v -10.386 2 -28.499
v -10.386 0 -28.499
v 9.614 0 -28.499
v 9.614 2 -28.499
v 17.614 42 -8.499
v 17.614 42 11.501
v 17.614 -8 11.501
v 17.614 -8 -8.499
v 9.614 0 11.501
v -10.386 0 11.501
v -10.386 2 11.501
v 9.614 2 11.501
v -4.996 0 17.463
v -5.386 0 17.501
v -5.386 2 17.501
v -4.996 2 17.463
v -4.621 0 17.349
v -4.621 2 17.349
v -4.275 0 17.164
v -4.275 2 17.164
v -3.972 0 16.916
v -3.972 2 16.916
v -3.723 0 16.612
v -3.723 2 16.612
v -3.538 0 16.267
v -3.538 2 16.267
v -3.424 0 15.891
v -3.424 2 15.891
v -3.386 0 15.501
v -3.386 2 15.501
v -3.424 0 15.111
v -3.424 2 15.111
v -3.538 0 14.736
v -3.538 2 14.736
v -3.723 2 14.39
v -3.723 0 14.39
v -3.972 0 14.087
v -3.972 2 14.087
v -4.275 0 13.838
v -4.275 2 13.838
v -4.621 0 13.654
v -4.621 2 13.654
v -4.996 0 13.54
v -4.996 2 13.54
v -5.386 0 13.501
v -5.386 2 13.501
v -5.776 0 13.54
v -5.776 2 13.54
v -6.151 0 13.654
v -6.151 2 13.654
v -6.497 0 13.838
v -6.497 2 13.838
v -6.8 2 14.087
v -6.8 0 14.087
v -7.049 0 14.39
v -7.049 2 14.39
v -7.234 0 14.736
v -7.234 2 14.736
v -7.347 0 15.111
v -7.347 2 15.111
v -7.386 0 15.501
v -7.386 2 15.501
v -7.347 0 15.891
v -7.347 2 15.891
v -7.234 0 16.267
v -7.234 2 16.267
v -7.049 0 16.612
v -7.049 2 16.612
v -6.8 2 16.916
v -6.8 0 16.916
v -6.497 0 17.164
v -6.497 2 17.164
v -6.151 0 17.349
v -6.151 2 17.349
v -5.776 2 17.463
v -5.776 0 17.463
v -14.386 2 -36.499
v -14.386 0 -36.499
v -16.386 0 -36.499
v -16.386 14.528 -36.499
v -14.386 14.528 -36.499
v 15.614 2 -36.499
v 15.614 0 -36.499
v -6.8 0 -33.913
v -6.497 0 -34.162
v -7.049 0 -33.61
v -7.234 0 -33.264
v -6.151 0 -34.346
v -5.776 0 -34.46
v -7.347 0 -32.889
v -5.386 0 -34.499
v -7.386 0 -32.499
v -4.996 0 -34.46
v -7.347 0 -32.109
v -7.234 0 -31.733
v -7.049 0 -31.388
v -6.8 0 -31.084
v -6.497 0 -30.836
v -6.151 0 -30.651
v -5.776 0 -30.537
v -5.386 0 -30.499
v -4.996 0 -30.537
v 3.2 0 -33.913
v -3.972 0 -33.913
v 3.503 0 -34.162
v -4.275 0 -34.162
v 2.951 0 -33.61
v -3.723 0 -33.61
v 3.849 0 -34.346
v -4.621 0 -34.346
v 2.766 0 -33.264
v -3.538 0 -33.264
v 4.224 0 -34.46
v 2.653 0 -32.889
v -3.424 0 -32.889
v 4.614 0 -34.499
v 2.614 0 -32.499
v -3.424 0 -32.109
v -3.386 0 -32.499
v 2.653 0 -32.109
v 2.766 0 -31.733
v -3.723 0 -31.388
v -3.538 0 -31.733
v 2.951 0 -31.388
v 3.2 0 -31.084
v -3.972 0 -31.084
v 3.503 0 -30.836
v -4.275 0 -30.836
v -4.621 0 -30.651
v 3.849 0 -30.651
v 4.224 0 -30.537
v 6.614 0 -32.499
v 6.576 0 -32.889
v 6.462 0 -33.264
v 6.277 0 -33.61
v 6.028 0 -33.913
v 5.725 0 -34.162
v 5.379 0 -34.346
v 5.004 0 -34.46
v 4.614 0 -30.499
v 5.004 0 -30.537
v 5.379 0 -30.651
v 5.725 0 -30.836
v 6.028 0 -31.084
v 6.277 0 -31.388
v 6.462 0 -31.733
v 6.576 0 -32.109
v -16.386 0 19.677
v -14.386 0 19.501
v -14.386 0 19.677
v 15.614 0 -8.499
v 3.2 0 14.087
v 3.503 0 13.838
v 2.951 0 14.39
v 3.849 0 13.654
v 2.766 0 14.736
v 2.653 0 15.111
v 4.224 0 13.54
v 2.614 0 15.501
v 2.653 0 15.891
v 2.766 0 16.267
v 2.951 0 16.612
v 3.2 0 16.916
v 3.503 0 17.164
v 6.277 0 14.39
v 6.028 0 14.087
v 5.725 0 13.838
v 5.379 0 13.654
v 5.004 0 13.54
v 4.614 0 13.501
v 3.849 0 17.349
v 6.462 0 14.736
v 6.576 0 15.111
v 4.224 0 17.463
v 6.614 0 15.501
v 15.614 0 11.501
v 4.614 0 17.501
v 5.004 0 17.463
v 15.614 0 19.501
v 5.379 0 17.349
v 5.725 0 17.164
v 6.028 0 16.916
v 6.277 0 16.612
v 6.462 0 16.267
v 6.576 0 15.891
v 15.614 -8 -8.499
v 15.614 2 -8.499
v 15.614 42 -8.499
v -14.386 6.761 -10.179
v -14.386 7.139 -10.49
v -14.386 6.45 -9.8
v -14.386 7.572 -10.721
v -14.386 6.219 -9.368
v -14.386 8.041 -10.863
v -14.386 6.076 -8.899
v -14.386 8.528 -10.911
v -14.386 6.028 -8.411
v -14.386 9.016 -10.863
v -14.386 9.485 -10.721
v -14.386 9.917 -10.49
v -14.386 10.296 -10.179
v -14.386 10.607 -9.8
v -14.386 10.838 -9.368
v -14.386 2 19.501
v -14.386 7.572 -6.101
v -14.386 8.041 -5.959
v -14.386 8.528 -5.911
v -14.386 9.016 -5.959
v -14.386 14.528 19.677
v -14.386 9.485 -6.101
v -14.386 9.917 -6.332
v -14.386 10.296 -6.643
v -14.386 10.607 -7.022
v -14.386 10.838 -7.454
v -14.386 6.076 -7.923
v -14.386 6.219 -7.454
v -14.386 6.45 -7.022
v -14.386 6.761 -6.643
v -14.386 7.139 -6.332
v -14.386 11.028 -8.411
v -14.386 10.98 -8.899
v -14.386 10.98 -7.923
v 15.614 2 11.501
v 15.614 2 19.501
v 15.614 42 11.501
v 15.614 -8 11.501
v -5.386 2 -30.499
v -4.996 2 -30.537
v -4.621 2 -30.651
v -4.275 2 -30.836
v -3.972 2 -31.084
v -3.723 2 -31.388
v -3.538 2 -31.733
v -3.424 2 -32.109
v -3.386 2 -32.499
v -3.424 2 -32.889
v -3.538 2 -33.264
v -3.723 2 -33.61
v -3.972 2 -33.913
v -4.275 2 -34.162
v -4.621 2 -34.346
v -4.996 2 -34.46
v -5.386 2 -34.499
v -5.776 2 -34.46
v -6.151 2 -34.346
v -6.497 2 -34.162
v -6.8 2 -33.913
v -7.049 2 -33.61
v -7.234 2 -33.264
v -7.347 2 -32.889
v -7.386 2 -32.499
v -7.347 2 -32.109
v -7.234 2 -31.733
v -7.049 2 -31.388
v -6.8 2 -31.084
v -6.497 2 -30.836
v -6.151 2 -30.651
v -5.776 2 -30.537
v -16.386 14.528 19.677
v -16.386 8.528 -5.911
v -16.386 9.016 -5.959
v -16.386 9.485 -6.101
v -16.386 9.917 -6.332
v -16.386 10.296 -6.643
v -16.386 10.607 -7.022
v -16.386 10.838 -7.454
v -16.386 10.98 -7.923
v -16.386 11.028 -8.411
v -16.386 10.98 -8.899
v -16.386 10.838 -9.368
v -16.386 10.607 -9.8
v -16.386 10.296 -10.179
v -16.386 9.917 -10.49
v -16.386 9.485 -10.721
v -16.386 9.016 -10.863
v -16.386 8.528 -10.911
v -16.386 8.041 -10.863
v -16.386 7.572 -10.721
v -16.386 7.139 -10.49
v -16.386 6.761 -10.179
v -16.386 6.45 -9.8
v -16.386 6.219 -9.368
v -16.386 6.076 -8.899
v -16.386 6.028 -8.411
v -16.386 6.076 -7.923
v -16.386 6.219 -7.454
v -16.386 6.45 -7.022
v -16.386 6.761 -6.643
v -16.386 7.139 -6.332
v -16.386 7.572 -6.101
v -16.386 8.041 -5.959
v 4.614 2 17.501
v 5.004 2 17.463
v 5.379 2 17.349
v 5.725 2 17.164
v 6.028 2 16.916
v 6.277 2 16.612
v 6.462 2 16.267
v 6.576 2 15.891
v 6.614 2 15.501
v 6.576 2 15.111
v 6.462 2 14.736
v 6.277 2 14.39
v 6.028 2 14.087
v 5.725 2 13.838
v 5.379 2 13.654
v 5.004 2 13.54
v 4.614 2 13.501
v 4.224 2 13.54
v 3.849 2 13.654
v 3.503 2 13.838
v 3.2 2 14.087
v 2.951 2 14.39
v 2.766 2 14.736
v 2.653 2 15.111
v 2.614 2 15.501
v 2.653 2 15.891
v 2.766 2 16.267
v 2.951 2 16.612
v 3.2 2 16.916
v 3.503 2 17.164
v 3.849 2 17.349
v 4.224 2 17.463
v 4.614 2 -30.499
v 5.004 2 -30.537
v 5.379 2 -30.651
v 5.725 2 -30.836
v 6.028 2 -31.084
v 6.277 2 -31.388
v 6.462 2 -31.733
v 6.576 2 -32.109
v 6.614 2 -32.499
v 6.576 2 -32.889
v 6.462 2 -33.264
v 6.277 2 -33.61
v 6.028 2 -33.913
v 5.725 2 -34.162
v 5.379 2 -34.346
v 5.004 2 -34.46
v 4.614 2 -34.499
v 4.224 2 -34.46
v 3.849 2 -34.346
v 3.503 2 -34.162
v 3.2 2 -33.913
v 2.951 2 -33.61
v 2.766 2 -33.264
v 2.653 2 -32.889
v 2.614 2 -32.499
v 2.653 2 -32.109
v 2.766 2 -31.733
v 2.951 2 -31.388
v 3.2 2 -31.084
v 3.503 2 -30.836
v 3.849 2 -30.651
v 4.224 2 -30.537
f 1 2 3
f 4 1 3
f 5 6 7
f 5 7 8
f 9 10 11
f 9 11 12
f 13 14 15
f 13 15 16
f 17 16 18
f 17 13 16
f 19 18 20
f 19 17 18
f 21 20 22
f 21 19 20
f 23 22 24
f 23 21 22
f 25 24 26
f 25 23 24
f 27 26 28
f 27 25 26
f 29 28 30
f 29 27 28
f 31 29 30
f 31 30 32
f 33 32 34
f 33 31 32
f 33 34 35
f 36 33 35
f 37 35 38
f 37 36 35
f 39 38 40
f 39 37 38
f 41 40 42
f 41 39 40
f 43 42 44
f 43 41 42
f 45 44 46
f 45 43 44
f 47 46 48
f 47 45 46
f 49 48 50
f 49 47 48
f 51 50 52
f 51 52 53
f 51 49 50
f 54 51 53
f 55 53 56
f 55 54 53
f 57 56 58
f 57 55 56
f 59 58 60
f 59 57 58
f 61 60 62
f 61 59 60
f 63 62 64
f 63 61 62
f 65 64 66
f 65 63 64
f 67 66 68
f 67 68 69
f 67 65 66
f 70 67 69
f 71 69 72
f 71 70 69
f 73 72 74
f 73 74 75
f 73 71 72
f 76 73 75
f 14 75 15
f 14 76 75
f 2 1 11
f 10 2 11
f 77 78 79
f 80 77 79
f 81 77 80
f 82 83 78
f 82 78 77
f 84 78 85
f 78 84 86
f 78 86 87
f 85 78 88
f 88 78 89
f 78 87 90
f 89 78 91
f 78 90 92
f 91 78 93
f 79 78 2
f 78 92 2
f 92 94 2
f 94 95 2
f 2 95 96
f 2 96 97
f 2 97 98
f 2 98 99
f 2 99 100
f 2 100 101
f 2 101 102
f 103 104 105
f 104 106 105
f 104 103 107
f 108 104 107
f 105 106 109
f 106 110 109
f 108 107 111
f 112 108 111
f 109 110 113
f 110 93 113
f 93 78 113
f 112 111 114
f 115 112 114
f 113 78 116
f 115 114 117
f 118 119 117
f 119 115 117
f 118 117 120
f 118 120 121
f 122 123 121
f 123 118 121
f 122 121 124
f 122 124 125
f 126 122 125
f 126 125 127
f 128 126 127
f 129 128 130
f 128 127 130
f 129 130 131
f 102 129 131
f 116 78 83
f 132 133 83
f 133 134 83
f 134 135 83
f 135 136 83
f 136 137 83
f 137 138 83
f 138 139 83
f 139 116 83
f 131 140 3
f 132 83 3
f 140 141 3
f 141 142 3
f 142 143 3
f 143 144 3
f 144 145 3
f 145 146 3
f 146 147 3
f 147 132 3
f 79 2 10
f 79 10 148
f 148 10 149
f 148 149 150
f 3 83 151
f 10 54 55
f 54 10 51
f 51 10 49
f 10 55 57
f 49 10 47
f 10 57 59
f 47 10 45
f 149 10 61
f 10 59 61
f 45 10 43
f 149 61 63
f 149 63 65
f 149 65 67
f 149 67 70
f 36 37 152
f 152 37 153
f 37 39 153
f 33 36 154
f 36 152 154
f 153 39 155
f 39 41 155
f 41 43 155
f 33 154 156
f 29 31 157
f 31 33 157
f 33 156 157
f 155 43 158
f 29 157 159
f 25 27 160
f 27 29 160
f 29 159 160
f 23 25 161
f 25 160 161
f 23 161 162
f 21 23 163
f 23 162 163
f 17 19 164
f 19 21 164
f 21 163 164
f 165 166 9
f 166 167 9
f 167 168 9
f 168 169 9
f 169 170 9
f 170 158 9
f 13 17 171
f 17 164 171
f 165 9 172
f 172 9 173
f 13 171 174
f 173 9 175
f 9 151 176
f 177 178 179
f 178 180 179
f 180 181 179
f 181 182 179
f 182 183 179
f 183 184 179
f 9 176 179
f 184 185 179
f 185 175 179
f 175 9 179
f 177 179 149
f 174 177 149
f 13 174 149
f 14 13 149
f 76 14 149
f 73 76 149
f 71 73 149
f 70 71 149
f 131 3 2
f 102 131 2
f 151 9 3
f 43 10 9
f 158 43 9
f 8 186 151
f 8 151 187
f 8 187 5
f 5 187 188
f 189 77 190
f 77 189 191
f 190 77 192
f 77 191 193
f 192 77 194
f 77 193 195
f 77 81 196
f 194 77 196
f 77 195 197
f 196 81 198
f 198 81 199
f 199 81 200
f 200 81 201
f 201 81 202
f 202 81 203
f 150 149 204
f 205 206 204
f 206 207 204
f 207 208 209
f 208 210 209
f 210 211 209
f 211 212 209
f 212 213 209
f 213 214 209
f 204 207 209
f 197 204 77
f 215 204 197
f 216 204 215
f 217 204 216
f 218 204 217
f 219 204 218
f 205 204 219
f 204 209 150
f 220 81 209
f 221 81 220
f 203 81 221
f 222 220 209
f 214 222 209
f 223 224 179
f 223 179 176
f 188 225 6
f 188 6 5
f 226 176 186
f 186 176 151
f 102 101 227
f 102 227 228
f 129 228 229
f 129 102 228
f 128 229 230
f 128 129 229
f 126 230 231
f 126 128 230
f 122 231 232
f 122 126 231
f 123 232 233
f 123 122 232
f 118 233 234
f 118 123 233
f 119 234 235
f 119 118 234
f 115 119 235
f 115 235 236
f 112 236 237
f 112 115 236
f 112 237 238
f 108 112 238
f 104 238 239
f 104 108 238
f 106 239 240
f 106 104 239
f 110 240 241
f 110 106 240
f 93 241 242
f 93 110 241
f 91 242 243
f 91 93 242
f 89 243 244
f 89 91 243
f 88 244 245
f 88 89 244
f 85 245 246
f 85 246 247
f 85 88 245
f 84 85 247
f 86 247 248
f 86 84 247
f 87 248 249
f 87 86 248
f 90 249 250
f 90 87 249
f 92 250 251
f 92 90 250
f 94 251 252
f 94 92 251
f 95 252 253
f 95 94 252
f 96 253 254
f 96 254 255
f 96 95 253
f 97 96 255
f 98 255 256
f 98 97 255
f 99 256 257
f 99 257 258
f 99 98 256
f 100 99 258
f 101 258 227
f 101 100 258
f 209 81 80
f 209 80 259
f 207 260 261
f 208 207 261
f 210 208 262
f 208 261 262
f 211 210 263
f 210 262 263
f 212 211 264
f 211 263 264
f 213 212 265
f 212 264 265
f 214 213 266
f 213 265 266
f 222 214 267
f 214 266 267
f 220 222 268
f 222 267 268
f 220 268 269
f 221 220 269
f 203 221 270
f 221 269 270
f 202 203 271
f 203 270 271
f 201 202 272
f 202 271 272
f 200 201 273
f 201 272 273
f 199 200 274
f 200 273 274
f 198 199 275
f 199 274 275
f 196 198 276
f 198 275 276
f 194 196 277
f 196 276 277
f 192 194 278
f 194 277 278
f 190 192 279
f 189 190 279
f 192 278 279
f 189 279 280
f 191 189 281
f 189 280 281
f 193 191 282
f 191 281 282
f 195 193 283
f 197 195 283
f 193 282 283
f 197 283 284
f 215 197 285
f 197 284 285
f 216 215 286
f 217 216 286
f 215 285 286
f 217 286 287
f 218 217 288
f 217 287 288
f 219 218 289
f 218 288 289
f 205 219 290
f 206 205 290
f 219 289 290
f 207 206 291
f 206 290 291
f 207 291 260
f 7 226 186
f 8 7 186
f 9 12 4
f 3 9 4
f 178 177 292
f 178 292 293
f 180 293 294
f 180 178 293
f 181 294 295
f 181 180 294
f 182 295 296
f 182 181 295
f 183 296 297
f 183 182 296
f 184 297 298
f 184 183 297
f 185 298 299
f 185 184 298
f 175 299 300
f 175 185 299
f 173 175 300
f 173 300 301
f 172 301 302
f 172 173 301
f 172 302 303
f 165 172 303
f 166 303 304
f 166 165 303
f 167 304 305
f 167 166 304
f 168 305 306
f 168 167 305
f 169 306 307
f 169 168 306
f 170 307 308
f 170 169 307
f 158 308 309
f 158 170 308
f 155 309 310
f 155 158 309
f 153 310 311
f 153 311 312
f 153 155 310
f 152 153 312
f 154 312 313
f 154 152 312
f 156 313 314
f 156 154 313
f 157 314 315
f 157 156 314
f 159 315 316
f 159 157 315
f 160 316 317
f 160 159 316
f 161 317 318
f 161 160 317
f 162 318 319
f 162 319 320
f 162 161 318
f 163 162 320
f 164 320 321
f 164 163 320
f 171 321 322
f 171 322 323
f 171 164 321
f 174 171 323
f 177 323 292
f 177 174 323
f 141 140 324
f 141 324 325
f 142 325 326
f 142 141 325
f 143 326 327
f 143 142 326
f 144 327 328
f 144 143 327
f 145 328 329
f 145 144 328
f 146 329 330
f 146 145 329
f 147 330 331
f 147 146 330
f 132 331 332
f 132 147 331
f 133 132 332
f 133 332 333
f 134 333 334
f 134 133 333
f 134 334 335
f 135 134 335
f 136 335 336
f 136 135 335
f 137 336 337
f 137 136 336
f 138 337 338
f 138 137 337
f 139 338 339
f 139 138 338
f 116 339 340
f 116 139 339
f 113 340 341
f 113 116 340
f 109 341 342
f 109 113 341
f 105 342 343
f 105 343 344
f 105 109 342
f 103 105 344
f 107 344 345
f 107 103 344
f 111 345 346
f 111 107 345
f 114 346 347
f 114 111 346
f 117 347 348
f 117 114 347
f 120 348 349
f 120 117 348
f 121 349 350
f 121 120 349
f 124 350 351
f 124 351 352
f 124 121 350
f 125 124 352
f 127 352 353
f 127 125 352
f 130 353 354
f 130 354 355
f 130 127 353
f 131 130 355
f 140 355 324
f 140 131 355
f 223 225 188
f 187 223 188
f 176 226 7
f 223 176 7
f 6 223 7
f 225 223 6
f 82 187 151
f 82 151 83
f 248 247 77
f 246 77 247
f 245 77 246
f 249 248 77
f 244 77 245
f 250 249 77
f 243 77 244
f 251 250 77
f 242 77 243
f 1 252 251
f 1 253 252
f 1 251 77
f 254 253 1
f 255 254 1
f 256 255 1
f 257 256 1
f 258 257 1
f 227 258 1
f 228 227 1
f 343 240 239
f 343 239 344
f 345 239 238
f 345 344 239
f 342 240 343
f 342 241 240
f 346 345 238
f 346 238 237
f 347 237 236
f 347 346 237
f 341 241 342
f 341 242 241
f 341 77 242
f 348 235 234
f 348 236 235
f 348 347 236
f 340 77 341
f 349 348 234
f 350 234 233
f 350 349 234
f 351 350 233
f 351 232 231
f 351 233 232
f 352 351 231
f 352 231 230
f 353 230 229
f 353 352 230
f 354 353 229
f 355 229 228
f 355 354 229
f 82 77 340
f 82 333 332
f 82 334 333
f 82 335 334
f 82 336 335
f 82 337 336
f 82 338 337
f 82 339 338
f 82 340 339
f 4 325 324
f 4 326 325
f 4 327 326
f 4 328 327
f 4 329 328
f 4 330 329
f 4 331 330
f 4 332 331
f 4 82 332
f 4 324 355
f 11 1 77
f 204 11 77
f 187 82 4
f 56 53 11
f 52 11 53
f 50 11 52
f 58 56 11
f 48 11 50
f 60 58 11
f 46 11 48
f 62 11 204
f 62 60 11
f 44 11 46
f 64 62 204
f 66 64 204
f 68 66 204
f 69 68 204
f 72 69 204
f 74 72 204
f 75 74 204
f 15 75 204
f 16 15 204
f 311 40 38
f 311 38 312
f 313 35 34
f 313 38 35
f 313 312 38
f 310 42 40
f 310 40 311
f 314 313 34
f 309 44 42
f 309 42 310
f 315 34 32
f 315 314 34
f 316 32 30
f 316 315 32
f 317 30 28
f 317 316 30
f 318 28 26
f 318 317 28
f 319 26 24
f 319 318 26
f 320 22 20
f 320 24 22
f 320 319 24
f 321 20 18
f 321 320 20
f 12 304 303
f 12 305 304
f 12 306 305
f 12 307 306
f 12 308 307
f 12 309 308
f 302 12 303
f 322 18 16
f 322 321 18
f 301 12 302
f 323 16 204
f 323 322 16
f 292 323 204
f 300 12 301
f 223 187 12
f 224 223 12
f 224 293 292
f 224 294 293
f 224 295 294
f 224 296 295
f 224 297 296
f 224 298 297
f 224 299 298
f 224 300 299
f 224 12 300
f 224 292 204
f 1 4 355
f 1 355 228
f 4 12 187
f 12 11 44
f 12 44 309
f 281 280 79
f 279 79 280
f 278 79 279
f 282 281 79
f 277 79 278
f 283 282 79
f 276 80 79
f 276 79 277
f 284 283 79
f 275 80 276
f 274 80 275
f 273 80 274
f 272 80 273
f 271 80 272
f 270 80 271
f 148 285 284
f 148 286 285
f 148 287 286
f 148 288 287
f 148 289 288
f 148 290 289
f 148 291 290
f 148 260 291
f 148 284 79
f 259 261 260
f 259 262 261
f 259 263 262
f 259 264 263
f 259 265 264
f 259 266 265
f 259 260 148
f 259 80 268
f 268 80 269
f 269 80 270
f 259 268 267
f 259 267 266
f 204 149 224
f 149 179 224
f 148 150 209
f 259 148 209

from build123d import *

# Parameters (mm, degrees)
SKETCH1_W             = 20
SKETCH1_H             = 8
SKETCH1_R             = 2
BOSS_EXTRUDE1_DEPTH   = 2
BOSS_EXTRUDE1_2_DEPTH = 2
SKETCH6_W             = 56
SKETCH6_H             = 2
BOSS_EXTRUDE5_DEPTH   = 6
SKETCH10_W            = 56
SKETCH10_H            = 2
BOSS_EXTRUDE7_DEPTH   = 4
SKETCH11_W            = 56.175194469
SKETCH11_H            = 14.528307745
BOSS_EXTRUDE8_DEPTH   = 2
SKETCH12_R            = 2.5
CUT_EXTRUDE3_DEPTH    = 2
SKETCH13_W            = 20
SKETCH13_H            = 50
BOSS_EXTRUDE9_DEPTH   = 2


with BuildPart() as part:
    # Sketch1 → Boss-Extrude1 (new body)
    with BuildSketch(Plane(origin=(0, 0, 0), x_dir=(1, 0, 0), z_dir=(0, 1, 0))):
        with Locations((-0.385906166, -15.501316712)):
            Rectangle(SKETCH1_W, SKETCH1_H)
        with Locations(Location((4.614093834, -15.501316712, 0), (0, 0, 270))):
            Circle(SKETCH1_R, mode=Mode.SUBTRACT)
        with Locations(Location((-5.385906166, -15.501316712, 0), (0, 0, 270))):
            Circle(SKETCH1_R, mode=Mode.SUBTRACT)
    extrude(amount=BOSS_EXTRUDE1_DEPTH)



with BuildPart() as body_2:
    # Sketch1 → Boss-Extrude1 2 (new body)
    with BuildSketch(Plane(origin=(0, 0, 0), x_dir=(1, 0, 0), z_dir=(0, 1, 0))):
        with Locations((-0.385906166, 32.498683288)):
            Rectangle(SKETCH1_W, SKETCH1_H)
        with Locations(Location((4.614093834, 32.498683288, 0), (0, 0, 270))):
            Circle(SKETCH1_R, mode=Mode.SUBTRACT)
        with Locations(Location((-5.385906166, 32.498683288, 0), (0, 0, 270))):
            Circle(SKETCH1_R, mode=Mode.SUBTRACT)
    extrude(amount=BOSS_EXTRUDE1_2_DEPTH)


with BuildPart() as part_1:
    add(part.part)

    add(body_2.part)  # Boss-Extrude5 merges body 2
    # Sketch6 → Boss-Extrude5 (add)
    with BuildSketch(Plane(origin=(9.614093834, 0, 0), x_dir=(0, 0, -1), z_dir=(1, 0, 0))):
        with Locations((8.498683288, 1)):
            Rectangle(SKETCH6_W, SKETCH6_H)
    extrude(amount=BOSS_EXTRUDE5_DEPTH)

    # Sketch10 → Boss-Extrude7 (add)
    with BuildSketch(Plane.ZY.offset(10.385906166)):
        with Locations((-8.498683288, 1)):
            Rectangle(SKETCH10_W, SKETCH10_H)
    extrude(amount=BOSS_EXTRUDE7_DEPTH)

    # Sketch11 → Boss-Extrude8 (add)
    with BuildSketch(Plane.ZY.offset(14.385906166)):
        with Locations((-8.411086054, 7.264153873)):
            Rectangle(SKETCH11_W, SKETCH11_H)
    extrude(amount=BOSS_EXTRUDE8_DEPTH)

    # Sketch12 → Cut-Extrude3 (cut)
    with BuildSketch(Plane.ZY.offset(16.385906166)):
        with Locations((-8.411086053, 8.528307745)):
            Circle(SKETCH12_R)
    extrude(amount=-CUT_EXTRUDE3_DEPTH, mode=Mode.SUBTRACT)

    # Sketch13 → Boss-Extrude9 (add)
    with BuildSketch(Plane(origin=(15.614093834, 0, 0), x_dir=(0, 0, -1), z_dir=(1, 0, 0))):
        with Locations((-1.501316712, 17)):
            Rectangle(SKETCH13_W, SKETCH13_H)
    extrude(amount=BOSS_EXTRUDE9_DEPTH)


solid = part_1.part
